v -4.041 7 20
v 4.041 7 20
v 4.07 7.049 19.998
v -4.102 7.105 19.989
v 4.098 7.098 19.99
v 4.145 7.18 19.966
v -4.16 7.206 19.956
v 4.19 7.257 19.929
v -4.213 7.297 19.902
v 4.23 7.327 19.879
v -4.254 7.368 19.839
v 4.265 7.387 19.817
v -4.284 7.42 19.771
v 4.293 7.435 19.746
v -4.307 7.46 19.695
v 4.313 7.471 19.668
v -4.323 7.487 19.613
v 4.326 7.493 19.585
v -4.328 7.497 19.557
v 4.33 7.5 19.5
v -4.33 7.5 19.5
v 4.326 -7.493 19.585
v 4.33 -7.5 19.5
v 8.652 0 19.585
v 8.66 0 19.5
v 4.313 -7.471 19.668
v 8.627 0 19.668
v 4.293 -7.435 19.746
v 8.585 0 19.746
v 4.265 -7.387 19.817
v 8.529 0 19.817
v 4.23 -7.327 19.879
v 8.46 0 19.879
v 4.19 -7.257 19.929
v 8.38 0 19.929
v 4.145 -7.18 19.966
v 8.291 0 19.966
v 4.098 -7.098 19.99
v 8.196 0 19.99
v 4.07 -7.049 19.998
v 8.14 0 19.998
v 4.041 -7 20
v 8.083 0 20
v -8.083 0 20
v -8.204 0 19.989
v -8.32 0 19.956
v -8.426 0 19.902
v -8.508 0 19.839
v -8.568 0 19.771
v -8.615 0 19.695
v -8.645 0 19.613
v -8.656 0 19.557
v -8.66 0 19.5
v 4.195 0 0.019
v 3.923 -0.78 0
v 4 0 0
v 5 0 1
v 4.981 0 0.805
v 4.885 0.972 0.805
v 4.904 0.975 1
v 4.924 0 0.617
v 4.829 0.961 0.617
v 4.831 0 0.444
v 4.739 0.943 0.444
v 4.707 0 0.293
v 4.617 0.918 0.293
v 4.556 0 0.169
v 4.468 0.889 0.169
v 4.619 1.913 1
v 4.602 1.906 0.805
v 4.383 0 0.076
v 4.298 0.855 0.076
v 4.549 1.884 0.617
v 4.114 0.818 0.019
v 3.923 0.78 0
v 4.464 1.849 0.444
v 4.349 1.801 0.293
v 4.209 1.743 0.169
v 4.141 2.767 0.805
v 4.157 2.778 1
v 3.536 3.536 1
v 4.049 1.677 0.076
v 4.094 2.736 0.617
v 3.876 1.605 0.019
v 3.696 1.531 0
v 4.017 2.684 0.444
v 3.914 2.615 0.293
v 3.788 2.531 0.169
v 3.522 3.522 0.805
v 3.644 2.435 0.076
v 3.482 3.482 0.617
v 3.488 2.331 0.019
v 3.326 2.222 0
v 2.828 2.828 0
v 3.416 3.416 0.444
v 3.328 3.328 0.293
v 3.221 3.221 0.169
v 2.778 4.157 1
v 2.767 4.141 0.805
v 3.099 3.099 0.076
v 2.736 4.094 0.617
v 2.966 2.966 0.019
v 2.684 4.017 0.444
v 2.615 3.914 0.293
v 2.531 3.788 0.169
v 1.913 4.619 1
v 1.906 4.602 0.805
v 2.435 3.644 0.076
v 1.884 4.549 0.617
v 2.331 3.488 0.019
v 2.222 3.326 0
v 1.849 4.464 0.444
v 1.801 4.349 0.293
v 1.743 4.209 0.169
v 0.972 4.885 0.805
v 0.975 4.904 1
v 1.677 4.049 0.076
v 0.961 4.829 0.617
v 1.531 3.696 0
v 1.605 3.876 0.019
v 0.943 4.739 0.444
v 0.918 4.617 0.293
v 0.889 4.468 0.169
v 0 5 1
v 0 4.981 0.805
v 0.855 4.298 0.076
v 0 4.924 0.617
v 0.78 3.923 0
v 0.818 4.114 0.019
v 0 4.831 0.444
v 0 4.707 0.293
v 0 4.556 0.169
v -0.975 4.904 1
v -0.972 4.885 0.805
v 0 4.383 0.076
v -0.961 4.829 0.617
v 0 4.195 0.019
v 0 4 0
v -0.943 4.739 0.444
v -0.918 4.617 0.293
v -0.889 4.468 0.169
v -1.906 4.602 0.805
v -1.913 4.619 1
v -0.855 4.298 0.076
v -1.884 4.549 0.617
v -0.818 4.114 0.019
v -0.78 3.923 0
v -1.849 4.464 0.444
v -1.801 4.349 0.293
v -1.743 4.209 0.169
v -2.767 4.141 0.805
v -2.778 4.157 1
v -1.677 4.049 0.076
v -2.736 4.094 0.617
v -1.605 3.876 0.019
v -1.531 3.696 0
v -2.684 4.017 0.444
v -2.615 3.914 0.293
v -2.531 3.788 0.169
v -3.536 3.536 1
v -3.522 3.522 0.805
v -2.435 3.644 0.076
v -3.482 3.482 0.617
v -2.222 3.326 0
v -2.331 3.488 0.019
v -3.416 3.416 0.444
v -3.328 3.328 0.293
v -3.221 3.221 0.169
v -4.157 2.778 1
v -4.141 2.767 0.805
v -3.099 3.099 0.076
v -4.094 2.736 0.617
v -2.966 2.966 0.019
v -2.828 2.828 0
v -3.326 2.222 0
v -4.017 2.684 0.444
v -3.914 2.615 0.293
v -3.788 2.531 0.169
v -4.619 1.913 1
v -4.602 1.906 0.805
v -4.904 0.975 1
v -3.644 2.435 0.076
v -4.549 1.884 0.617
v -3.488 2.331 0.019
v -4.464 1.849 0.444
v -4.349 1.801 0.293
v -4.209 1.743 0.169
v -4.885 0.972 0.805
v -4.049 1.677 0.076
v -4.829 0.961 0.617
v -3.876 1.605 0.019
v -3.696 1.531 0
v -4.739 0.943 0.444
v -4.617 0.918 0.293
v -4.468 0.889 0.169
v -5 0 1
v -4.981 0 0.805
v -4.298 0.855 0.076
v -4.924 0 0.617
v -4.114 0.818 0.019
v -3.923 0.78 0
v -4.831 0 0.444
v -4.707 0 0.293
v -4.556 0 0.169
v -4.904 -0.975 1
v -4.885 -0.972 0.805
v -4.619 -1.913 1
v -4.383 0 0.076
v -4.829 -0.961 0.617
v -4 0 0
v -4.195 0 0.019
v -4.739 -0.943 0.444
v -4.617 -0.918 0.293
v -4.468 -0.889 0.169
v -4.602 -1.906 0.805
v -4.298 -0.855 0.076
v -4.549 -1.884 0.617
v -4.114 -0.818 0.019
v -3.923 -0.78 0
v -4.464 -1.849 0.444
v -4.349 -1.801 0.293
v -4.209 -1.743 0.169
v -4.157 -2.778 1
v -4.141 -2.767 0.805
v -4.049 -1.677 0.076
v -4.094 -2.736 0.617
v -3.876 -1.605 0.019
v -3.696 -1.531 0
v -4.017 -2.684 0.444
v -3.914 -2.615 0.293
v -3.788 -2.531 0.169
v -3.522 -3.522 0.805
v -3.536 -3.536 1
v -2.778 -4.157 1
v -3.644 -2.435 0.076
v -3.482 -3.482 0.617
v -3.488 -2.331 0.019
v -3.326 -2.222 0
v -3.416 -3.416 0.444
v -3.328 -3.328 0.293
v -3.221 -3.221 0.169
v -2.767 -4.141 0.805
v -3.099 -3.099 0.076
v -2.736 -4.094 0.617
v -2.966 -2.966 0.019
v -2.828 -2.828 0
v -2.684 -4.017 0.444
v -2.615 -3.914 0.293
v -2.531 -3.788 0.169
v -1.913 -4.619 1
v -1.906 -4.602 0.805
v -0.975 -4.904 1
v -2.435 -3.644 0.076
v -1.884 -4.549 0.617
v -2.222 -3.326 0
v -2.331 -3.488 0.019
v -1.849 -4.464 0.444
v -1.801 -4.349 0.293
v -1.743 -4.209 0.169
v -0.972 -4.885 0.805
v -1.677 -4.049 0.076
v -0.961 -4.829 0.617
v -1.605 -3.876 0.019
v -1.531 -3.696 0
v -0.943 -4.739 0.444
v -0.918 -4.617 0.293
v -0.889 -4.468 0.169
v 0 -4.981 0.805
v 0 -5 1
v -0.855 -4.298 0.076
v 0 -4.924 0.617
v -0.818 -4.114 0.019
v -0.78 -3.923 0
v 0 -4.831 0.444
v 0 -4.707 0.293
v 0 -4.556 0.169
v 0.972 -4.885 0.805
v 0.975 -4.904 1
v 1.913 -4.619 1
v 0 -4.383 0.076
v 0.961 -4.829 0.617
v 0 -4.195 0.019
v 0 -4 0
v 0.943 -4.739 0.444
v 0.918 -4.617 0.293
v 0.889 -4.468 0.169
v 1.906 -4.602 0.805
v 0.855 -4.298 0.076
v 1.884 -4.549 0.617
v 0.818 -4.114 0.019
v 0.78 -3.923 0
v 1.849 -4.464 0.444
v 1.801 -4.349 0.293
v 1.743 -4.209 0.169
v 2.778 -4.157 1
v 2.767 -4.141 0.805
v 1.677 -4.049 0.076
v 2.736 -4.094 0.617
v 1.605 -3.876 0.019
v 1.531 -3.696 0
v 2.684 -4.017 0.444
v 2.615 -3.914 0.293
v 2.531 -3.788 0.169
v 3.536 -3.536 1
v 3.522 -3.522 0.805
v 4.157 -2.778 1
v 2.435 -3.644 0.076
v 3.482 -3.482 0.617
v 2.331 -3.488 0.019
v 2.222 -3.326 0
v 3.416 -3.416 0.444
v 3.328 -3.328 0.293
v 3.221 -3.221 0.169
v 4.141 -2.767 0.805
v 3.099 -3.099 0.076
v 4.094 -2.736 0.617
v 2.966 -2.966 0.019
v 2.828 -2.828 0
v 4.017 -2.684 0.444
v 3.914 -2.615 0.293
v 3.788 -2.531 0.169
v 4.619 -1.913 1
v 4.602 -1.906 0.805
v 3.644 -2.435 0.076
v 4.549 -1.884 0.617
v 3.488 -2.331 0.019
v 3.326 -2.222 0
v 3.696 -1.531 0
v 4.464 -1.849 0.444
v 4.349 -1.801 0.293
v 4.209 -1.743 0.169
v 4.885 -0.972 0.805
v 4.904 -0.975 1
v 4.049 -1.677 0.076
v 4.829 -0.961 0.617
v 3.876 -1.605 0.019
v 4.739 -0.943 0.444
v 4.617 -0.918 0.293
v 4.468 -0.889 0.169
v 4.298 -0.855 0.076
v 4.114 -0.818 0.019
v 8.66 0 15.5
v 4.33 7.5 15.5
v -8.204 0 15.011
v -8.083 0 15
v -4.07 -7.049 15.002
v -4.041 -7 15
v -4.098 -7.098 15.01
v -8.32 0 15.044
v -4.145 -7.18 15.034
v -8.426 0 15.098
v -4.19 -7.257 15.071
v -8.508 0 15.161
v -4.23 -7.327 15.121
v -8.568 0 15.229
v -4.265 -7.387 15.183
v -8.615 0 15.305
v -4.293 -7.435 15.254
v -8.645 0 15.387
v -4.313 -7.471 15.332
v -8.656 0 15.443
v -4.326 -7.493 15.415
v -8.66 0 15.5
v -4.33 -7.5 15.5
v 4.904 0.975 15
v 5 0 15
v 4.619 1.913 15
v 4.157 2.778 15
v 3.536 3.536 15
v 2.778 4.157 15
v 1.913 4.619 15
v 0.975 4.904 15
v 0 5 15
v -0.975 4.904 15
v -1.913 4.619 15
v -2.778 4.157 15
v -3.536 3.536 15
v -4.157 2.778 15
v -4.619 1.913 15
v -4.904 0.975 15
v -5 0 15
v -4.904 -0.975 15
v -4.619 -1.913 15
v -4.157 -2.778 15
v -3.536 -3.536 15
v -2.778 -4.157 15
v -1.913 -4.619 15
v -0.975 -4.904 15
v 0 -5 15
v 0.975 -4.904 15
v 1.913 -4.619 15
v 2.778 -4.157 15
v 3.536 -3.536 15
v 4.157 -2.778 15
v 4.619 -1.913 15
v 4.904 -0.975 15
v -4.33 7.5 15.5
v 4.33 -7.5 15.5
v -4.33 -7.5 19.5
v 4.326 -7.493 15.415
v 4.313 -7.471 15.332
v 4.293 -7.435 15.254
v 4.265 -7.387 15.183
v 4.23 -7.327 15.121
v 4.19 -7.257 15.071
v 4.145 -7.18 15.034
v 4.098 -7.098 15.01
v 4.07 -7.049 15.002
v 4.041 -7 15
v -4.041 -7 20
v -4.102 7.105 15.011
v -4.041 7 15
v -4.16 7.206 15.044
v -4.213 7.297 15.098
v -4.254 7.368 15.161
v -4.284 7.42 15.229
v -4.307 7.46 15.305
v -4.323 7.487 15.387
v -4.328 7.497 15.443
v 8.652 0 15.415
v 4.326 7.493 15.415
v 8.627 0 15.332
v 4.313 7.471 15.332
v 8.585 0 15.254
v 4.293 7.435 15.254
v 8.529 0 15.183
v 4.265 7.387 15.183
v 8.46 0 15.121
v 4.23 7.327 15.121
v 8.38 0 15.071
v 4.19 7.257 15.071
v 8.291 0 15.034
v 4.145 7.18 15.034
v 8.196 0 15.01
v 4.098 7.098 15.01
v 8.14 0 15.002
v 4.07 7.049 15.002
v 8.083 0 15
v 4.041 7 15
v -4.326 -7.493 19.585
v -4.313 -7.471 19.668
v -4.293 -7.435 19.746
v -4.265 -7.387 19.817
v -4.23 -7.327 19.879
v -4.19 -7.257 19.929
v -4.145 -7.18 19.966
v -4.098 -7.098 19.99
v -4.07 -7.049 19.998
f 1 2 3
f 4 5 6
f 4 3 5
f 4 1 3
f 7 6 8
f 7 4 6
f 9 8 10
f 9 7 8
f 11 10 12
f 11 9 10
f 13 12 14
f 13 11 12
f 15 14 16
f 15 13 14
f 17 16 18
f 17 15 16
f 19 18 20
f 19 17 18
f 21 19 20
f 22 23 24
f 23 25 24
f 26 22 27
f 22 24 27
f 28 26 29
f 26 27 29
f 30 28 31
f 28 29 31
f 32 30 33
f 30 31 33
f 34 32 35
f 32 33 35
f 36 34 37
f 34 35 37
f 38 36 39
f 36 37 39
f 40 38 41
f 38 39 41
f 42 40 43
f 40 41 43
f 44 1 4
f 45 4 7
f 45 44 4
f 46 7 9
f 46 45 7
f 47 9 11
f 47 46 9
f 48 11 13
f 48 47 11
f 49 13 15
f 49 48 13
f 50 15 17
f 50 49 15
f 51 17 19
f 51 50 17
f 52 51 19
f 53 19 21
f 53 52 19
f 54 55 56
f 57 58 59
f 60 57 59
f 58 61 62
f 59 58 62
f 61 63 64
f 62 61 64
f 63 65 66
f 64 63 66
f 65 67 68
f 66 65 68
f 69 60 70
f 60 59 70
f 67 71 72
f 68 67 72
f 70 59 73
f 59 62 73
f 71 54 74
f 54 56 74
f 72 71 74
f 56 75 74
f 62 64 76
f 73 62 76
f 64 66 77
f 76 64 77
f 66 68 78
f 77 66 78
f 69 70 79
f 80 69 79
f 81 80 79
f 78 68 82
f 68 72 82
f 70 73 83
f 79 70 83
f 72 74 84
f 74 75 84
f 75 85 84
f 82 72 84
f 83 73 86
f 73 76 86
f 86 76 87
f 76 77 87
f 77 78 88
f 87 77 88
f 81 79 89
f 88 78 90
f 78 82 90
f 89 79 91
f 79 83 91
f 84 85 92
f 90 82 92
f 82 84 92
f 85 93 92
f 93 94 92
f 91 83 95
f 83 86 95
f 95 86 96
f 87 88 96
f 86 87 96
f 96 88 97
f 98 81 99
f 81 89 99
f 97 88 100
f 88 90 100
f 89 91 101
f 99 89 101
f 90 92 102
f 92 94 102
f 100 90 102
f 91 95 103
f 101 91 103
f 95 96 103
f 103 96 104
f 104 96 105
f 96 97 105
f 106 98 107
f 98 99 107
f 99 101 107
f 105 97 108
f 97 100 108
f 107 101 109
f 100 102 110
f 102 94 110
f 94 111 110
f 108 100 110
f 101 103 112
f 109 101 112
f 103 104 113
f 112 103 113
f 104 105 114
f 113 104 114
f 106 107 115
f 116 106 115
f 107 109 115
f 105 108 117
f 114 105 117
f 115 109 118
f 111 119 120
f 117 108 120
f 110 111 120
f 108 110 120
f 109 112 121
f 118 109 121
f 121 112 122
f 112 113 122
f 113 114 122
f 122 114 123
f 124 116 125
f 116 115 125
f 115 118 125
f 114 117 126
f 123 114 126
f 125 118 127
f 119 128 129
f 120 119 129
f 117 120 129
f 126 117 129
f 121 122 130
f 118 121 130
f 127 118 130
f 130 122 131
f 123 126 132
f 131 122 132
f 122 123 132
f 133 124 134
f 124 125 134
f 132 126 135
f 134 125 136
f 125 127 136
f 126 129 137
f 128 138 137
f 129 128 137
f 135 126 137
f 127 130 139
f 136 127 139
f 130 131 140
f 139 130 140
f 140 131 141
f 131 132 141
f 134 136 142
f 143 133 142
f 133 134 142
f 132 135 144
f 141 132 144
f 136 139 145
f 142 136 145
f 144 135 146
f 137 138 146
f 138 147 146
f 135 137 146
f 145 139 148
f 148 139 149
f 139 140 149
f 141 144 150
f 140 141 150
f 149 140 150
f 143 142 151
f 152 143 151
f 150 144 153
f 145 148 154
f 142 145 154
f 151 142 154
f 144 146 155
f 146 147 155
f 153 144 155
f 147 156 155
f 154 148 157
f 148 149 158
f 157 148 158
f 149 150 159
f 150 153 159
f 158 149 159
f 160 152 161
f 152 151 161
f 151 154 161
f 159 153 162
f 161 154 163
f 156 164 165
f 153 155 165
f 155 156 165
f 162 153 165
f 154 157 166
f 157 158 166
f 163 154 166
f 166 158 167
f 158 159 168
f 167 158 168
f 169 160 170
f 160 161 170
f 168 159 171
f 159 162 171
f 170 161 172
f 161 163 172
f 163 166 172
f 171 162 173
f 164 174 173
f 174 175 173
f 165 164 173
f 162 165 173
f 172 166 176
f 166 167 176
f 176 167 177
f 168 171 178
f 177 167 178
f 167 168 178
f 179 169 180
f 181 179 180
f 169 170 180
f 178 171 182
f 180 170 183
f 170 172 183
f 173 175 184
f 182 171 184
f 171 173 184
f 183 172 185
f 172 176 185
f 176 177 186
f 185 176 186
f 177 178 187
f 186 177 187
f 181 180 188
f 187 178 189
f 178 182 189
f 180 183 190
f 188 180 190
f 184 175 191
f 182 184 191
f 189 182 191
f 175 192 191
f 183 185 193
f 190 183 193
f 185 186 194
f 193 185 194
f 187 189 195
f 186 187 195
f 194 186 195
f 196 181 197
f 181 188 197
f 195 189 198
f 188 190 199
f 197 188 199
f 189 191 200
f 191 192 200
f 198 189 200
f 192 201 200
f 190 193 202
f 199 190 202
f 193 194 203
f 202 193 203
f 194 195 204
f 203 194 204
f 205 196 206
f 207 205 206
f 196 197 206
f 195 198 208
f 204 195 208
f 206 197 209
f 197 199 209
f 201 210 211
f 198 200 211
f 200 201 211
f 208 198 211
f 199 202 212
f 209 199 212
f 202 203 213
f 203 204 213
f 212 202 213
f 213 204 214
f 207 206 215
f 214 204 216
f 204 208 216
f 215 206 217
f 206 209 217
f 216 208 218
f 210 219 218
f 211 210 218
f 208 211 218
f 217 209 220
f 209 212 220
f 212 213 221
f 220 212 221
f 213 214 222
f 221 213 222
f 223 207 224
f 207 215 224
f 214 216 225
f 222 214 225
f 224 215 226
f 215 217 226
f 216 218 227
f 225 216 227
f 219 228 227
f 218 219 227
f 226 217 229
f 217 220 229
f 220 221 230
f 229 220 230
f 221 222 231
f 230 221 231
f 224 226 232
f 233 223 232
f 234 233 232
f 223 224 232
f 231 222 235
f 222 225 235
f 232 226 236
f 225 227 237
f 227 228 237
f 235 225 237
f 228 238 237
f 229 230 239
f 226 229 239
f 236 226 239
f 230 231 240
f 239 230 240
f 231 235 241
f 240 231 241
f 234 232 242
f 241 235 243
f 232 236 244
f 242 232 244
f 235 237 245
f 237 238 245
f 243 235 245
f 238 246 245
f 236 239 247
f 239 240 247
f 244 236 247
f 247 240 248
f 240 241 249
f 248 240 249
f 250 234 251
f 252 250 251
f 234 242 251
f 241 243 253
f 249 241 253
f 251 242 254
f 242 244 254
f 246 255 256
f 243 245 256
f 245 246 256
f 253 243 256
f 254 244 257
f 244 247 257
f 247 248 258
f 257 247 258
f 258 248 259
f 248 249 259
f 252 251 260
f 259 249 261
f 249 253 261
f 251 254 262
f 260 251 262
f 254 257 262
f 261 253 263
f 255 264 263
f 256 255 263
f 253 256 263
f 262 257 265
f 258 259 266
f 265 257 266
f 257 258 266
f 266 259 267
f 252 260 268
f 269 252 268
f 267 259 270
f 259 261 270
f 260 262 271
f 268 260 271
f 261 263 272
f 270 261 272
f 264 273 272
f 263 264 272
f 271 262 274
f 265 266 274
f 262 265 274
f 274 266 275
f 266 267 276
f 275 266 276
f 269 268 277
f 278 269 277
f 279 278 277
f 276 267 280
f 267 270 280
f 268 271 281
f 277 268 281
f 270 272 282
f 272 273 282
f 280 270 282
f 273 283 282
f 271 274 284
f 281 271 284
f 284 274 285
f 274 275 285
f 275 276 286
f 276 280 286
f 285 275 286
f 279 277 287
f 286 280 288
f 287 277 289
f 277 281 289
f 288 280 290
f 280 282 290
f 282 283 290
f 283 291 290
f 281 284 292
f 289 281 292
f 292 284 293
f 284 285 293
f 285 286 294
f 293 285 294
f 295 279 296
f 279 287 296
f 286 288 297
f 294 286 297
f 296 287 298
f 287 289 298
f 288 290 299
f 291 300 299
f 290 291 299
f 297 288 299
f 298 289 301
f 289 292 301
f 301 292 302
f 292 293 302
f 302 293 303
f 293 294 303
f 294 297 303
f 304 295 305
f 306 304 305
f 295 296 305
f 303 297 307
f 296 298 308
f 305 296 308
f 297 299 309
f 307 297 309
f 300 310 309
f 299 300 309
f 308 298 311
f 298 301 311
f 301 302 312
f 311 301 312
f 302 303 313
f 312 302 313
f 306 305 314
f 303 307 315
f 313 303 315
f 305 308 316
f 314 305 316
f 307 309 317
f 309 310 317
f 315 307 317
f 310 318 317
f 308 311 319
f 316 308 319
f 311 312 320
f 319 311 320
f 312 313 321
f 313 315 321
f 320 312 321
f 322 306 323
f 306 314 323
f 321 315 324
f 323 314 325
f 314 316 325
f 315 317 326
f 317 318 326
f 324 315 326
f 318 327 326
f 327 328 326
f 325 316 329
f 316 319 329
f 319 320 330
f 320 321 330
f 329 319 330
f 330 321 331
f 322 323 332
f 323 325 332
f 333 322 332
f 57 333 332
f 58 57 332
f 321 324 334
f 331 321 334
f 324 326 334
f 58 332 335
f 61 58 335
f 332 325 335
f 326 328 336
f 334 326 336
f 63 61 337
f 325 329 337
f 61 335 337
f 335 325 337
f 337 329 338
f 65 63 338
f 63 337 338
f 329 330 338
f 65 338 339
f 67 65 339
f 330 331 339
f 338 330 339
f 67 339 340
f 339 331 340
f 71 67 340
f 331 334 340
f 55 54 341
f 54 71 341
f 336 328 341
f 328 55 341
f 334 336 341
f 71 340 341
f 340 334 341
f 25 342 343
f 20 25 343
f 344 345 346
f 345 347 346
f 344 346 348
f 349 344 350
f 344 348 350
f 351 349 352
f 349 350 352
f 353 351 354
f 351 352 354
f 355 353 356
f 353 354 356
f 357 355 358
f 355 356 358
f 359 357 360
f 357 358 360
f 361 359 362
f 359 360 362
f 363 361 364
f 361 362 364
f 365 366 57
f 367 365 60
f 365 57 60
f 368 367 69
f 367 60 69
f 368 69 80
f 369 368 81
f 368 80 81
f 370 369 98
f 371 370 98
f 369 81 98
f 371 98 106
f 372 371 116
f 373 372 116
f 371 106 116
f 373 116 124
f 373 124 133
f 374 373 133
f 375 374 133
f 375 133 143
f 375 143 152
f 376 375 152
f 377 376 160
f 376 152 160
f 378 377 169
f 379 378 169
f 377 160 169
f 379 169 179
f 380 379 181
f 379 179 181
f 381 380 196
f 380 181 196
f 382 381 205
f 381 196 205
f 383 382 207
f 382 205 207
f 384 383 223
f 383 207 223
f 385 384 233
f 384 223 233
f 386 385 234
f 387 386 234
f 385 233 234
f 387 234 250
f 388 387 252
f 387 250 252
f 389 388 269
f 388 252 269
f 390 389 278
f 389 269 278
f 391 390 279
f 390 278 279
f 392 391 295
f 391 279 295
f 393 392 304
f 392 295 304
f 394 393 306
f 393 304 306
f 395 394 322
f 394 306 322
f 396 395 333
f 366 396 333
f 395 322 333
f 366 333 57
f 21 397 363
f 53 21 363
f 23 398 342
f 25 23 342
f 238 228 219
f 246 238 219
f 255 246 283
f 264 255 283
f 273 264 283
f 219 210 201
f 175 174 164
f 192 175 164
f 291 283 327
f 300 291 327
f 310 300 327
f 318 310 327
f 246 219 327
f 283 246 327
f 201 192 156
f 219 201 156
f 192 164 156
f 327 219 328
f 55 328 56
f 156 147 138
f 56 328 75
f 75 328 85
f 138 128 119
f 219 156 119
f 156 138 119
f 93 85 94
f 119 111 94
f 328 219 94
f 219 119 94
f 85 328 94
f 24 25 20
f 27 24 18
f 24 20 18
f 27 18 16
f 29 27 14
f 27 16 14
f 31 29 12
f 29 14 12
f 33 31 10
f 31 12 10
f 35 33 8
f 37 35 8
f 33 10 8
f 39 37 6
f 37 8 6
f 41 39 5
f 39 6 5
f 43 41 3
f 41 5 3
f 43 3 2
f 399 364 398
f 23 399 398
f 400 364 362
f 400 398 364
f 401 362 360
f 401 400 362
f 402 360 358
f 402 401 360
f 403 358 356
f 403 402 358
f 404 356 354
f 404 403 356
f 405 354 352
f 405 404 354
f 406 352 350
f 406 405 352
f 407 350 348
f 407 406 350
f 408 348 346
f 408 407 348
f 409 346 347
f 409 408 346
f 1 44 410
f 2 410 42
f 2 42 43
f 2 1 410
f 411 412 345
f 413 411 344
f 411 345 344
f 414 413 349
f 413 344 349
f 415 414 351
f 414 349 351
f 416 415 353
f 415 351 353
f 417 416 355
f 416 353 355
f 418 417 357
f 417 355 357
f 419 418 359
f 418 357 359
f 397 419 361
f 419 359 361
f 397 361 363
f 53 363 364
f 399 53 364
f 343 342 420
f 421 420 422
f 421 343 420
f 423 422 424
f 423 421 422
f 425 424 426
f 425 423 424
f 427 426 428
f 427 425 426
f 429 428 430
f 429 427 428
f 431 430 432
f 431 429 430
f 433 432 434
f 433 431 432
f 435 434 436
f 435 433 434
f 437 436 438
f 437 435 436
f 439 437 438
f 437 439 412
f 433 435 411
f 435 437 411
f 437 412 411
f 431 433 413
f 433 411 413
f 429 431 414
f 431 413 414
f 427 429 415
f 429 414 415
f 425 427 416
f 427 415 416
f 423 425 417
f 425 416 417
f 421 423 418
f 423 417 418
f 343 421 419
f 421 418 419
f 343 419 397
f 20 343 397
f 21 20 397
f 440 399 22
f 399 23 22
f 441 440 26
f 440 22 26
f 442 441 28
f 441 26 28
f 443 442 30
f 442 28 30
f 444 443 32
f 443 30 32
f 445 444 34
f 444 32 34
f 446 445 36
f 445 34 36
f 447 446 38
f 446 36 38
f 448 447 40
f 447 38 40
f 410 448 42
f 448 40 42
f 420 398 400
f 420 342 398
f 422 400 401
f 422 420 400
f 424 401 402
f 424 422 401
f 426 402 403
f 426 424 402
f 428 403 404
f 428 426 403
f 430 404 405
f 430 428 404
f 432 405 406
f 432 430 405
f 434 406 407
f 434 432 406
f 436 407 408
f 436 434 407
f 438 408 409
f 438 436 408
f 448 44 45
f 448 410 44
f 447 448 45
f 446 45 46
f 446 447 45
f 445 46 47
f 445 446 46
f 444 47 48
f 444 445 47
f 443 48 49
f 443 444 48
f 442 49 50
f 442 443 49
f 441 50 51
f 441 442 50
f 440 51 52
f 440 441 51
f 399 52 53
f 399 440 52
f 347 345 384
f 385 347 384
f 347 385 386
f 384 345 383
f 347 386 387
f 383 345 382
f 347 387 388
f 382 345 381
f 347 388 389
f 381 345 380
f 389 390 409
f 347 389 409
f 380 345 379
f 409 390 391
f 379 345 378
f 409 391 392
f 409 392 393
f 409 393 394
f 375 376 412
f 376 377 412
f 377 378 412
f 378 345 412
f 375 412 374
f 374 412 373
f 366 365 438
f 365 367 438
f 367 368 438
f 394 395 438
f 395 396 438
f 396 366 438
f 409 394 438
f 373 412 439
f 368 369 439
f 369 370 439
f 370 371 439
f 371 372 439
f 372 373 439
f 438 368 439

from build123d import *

# Parameters (mm, degrees)
SKETCH_1_R      = 5
EXTRUDE_1_DEPTH = 15
EXTRUDE_2_DEPTH = 5
FILLET_1_R      = 0.5
FILLET_2_R      = 1


with BuildPart() as part:
    # 草图1 → 凸台-拉伸1 (new body)
    with BuildSketch(Plane.XY):
        Circle(SKETCH_1_R)
    extrude(amount=EXTRUDE_1_DEPTH)

    # 草图2 → 凸台-拉伸2 (add)
    with BuildSketch(Plane.XY.offset(15)):
        Polygon((4.330127019, -7.5), (8.660254038, 0), (4.330127019, 7.5), (-4.330127019, 7.5), (-8.660254038, 0), (-4.330127019, -7.5), align=None)
    extrude(amount=EXTRUDE_2_DEPTH)

    # 圆角1
    fillet_1_edges = [part.edges().sort_by_distance(p)[0] for p in [
        (0, -7.5, 15),
        (6.495190528, -3.75, 15),
        (6.495190528, 3.75, 15),
        (0, 7.5, 15),
        (-6.495190528, 3.75, 15),
        (-6.495190528, -3.75, 15),
        (0, -7.5, 20),
        (6.495190528, -3.75, 20),
        (6.495190528, 3.75, 20),
        (0, 7.5, 20),
        (-6.495190528, 3.75, 20),
        (-6.495190528, -3.75, 20),
    ]]
    fillet(fillet_1_edges, radius=FILLET_1_R)

    # 圆角2
    fillet_2_edges = [part.edges().sort_by_distance(p)[0] for p in [
        (-5, 0, 0),
    ]]
    fillet(fillet_2_edges, radius=FILLET_2_R)


solid = part.part
